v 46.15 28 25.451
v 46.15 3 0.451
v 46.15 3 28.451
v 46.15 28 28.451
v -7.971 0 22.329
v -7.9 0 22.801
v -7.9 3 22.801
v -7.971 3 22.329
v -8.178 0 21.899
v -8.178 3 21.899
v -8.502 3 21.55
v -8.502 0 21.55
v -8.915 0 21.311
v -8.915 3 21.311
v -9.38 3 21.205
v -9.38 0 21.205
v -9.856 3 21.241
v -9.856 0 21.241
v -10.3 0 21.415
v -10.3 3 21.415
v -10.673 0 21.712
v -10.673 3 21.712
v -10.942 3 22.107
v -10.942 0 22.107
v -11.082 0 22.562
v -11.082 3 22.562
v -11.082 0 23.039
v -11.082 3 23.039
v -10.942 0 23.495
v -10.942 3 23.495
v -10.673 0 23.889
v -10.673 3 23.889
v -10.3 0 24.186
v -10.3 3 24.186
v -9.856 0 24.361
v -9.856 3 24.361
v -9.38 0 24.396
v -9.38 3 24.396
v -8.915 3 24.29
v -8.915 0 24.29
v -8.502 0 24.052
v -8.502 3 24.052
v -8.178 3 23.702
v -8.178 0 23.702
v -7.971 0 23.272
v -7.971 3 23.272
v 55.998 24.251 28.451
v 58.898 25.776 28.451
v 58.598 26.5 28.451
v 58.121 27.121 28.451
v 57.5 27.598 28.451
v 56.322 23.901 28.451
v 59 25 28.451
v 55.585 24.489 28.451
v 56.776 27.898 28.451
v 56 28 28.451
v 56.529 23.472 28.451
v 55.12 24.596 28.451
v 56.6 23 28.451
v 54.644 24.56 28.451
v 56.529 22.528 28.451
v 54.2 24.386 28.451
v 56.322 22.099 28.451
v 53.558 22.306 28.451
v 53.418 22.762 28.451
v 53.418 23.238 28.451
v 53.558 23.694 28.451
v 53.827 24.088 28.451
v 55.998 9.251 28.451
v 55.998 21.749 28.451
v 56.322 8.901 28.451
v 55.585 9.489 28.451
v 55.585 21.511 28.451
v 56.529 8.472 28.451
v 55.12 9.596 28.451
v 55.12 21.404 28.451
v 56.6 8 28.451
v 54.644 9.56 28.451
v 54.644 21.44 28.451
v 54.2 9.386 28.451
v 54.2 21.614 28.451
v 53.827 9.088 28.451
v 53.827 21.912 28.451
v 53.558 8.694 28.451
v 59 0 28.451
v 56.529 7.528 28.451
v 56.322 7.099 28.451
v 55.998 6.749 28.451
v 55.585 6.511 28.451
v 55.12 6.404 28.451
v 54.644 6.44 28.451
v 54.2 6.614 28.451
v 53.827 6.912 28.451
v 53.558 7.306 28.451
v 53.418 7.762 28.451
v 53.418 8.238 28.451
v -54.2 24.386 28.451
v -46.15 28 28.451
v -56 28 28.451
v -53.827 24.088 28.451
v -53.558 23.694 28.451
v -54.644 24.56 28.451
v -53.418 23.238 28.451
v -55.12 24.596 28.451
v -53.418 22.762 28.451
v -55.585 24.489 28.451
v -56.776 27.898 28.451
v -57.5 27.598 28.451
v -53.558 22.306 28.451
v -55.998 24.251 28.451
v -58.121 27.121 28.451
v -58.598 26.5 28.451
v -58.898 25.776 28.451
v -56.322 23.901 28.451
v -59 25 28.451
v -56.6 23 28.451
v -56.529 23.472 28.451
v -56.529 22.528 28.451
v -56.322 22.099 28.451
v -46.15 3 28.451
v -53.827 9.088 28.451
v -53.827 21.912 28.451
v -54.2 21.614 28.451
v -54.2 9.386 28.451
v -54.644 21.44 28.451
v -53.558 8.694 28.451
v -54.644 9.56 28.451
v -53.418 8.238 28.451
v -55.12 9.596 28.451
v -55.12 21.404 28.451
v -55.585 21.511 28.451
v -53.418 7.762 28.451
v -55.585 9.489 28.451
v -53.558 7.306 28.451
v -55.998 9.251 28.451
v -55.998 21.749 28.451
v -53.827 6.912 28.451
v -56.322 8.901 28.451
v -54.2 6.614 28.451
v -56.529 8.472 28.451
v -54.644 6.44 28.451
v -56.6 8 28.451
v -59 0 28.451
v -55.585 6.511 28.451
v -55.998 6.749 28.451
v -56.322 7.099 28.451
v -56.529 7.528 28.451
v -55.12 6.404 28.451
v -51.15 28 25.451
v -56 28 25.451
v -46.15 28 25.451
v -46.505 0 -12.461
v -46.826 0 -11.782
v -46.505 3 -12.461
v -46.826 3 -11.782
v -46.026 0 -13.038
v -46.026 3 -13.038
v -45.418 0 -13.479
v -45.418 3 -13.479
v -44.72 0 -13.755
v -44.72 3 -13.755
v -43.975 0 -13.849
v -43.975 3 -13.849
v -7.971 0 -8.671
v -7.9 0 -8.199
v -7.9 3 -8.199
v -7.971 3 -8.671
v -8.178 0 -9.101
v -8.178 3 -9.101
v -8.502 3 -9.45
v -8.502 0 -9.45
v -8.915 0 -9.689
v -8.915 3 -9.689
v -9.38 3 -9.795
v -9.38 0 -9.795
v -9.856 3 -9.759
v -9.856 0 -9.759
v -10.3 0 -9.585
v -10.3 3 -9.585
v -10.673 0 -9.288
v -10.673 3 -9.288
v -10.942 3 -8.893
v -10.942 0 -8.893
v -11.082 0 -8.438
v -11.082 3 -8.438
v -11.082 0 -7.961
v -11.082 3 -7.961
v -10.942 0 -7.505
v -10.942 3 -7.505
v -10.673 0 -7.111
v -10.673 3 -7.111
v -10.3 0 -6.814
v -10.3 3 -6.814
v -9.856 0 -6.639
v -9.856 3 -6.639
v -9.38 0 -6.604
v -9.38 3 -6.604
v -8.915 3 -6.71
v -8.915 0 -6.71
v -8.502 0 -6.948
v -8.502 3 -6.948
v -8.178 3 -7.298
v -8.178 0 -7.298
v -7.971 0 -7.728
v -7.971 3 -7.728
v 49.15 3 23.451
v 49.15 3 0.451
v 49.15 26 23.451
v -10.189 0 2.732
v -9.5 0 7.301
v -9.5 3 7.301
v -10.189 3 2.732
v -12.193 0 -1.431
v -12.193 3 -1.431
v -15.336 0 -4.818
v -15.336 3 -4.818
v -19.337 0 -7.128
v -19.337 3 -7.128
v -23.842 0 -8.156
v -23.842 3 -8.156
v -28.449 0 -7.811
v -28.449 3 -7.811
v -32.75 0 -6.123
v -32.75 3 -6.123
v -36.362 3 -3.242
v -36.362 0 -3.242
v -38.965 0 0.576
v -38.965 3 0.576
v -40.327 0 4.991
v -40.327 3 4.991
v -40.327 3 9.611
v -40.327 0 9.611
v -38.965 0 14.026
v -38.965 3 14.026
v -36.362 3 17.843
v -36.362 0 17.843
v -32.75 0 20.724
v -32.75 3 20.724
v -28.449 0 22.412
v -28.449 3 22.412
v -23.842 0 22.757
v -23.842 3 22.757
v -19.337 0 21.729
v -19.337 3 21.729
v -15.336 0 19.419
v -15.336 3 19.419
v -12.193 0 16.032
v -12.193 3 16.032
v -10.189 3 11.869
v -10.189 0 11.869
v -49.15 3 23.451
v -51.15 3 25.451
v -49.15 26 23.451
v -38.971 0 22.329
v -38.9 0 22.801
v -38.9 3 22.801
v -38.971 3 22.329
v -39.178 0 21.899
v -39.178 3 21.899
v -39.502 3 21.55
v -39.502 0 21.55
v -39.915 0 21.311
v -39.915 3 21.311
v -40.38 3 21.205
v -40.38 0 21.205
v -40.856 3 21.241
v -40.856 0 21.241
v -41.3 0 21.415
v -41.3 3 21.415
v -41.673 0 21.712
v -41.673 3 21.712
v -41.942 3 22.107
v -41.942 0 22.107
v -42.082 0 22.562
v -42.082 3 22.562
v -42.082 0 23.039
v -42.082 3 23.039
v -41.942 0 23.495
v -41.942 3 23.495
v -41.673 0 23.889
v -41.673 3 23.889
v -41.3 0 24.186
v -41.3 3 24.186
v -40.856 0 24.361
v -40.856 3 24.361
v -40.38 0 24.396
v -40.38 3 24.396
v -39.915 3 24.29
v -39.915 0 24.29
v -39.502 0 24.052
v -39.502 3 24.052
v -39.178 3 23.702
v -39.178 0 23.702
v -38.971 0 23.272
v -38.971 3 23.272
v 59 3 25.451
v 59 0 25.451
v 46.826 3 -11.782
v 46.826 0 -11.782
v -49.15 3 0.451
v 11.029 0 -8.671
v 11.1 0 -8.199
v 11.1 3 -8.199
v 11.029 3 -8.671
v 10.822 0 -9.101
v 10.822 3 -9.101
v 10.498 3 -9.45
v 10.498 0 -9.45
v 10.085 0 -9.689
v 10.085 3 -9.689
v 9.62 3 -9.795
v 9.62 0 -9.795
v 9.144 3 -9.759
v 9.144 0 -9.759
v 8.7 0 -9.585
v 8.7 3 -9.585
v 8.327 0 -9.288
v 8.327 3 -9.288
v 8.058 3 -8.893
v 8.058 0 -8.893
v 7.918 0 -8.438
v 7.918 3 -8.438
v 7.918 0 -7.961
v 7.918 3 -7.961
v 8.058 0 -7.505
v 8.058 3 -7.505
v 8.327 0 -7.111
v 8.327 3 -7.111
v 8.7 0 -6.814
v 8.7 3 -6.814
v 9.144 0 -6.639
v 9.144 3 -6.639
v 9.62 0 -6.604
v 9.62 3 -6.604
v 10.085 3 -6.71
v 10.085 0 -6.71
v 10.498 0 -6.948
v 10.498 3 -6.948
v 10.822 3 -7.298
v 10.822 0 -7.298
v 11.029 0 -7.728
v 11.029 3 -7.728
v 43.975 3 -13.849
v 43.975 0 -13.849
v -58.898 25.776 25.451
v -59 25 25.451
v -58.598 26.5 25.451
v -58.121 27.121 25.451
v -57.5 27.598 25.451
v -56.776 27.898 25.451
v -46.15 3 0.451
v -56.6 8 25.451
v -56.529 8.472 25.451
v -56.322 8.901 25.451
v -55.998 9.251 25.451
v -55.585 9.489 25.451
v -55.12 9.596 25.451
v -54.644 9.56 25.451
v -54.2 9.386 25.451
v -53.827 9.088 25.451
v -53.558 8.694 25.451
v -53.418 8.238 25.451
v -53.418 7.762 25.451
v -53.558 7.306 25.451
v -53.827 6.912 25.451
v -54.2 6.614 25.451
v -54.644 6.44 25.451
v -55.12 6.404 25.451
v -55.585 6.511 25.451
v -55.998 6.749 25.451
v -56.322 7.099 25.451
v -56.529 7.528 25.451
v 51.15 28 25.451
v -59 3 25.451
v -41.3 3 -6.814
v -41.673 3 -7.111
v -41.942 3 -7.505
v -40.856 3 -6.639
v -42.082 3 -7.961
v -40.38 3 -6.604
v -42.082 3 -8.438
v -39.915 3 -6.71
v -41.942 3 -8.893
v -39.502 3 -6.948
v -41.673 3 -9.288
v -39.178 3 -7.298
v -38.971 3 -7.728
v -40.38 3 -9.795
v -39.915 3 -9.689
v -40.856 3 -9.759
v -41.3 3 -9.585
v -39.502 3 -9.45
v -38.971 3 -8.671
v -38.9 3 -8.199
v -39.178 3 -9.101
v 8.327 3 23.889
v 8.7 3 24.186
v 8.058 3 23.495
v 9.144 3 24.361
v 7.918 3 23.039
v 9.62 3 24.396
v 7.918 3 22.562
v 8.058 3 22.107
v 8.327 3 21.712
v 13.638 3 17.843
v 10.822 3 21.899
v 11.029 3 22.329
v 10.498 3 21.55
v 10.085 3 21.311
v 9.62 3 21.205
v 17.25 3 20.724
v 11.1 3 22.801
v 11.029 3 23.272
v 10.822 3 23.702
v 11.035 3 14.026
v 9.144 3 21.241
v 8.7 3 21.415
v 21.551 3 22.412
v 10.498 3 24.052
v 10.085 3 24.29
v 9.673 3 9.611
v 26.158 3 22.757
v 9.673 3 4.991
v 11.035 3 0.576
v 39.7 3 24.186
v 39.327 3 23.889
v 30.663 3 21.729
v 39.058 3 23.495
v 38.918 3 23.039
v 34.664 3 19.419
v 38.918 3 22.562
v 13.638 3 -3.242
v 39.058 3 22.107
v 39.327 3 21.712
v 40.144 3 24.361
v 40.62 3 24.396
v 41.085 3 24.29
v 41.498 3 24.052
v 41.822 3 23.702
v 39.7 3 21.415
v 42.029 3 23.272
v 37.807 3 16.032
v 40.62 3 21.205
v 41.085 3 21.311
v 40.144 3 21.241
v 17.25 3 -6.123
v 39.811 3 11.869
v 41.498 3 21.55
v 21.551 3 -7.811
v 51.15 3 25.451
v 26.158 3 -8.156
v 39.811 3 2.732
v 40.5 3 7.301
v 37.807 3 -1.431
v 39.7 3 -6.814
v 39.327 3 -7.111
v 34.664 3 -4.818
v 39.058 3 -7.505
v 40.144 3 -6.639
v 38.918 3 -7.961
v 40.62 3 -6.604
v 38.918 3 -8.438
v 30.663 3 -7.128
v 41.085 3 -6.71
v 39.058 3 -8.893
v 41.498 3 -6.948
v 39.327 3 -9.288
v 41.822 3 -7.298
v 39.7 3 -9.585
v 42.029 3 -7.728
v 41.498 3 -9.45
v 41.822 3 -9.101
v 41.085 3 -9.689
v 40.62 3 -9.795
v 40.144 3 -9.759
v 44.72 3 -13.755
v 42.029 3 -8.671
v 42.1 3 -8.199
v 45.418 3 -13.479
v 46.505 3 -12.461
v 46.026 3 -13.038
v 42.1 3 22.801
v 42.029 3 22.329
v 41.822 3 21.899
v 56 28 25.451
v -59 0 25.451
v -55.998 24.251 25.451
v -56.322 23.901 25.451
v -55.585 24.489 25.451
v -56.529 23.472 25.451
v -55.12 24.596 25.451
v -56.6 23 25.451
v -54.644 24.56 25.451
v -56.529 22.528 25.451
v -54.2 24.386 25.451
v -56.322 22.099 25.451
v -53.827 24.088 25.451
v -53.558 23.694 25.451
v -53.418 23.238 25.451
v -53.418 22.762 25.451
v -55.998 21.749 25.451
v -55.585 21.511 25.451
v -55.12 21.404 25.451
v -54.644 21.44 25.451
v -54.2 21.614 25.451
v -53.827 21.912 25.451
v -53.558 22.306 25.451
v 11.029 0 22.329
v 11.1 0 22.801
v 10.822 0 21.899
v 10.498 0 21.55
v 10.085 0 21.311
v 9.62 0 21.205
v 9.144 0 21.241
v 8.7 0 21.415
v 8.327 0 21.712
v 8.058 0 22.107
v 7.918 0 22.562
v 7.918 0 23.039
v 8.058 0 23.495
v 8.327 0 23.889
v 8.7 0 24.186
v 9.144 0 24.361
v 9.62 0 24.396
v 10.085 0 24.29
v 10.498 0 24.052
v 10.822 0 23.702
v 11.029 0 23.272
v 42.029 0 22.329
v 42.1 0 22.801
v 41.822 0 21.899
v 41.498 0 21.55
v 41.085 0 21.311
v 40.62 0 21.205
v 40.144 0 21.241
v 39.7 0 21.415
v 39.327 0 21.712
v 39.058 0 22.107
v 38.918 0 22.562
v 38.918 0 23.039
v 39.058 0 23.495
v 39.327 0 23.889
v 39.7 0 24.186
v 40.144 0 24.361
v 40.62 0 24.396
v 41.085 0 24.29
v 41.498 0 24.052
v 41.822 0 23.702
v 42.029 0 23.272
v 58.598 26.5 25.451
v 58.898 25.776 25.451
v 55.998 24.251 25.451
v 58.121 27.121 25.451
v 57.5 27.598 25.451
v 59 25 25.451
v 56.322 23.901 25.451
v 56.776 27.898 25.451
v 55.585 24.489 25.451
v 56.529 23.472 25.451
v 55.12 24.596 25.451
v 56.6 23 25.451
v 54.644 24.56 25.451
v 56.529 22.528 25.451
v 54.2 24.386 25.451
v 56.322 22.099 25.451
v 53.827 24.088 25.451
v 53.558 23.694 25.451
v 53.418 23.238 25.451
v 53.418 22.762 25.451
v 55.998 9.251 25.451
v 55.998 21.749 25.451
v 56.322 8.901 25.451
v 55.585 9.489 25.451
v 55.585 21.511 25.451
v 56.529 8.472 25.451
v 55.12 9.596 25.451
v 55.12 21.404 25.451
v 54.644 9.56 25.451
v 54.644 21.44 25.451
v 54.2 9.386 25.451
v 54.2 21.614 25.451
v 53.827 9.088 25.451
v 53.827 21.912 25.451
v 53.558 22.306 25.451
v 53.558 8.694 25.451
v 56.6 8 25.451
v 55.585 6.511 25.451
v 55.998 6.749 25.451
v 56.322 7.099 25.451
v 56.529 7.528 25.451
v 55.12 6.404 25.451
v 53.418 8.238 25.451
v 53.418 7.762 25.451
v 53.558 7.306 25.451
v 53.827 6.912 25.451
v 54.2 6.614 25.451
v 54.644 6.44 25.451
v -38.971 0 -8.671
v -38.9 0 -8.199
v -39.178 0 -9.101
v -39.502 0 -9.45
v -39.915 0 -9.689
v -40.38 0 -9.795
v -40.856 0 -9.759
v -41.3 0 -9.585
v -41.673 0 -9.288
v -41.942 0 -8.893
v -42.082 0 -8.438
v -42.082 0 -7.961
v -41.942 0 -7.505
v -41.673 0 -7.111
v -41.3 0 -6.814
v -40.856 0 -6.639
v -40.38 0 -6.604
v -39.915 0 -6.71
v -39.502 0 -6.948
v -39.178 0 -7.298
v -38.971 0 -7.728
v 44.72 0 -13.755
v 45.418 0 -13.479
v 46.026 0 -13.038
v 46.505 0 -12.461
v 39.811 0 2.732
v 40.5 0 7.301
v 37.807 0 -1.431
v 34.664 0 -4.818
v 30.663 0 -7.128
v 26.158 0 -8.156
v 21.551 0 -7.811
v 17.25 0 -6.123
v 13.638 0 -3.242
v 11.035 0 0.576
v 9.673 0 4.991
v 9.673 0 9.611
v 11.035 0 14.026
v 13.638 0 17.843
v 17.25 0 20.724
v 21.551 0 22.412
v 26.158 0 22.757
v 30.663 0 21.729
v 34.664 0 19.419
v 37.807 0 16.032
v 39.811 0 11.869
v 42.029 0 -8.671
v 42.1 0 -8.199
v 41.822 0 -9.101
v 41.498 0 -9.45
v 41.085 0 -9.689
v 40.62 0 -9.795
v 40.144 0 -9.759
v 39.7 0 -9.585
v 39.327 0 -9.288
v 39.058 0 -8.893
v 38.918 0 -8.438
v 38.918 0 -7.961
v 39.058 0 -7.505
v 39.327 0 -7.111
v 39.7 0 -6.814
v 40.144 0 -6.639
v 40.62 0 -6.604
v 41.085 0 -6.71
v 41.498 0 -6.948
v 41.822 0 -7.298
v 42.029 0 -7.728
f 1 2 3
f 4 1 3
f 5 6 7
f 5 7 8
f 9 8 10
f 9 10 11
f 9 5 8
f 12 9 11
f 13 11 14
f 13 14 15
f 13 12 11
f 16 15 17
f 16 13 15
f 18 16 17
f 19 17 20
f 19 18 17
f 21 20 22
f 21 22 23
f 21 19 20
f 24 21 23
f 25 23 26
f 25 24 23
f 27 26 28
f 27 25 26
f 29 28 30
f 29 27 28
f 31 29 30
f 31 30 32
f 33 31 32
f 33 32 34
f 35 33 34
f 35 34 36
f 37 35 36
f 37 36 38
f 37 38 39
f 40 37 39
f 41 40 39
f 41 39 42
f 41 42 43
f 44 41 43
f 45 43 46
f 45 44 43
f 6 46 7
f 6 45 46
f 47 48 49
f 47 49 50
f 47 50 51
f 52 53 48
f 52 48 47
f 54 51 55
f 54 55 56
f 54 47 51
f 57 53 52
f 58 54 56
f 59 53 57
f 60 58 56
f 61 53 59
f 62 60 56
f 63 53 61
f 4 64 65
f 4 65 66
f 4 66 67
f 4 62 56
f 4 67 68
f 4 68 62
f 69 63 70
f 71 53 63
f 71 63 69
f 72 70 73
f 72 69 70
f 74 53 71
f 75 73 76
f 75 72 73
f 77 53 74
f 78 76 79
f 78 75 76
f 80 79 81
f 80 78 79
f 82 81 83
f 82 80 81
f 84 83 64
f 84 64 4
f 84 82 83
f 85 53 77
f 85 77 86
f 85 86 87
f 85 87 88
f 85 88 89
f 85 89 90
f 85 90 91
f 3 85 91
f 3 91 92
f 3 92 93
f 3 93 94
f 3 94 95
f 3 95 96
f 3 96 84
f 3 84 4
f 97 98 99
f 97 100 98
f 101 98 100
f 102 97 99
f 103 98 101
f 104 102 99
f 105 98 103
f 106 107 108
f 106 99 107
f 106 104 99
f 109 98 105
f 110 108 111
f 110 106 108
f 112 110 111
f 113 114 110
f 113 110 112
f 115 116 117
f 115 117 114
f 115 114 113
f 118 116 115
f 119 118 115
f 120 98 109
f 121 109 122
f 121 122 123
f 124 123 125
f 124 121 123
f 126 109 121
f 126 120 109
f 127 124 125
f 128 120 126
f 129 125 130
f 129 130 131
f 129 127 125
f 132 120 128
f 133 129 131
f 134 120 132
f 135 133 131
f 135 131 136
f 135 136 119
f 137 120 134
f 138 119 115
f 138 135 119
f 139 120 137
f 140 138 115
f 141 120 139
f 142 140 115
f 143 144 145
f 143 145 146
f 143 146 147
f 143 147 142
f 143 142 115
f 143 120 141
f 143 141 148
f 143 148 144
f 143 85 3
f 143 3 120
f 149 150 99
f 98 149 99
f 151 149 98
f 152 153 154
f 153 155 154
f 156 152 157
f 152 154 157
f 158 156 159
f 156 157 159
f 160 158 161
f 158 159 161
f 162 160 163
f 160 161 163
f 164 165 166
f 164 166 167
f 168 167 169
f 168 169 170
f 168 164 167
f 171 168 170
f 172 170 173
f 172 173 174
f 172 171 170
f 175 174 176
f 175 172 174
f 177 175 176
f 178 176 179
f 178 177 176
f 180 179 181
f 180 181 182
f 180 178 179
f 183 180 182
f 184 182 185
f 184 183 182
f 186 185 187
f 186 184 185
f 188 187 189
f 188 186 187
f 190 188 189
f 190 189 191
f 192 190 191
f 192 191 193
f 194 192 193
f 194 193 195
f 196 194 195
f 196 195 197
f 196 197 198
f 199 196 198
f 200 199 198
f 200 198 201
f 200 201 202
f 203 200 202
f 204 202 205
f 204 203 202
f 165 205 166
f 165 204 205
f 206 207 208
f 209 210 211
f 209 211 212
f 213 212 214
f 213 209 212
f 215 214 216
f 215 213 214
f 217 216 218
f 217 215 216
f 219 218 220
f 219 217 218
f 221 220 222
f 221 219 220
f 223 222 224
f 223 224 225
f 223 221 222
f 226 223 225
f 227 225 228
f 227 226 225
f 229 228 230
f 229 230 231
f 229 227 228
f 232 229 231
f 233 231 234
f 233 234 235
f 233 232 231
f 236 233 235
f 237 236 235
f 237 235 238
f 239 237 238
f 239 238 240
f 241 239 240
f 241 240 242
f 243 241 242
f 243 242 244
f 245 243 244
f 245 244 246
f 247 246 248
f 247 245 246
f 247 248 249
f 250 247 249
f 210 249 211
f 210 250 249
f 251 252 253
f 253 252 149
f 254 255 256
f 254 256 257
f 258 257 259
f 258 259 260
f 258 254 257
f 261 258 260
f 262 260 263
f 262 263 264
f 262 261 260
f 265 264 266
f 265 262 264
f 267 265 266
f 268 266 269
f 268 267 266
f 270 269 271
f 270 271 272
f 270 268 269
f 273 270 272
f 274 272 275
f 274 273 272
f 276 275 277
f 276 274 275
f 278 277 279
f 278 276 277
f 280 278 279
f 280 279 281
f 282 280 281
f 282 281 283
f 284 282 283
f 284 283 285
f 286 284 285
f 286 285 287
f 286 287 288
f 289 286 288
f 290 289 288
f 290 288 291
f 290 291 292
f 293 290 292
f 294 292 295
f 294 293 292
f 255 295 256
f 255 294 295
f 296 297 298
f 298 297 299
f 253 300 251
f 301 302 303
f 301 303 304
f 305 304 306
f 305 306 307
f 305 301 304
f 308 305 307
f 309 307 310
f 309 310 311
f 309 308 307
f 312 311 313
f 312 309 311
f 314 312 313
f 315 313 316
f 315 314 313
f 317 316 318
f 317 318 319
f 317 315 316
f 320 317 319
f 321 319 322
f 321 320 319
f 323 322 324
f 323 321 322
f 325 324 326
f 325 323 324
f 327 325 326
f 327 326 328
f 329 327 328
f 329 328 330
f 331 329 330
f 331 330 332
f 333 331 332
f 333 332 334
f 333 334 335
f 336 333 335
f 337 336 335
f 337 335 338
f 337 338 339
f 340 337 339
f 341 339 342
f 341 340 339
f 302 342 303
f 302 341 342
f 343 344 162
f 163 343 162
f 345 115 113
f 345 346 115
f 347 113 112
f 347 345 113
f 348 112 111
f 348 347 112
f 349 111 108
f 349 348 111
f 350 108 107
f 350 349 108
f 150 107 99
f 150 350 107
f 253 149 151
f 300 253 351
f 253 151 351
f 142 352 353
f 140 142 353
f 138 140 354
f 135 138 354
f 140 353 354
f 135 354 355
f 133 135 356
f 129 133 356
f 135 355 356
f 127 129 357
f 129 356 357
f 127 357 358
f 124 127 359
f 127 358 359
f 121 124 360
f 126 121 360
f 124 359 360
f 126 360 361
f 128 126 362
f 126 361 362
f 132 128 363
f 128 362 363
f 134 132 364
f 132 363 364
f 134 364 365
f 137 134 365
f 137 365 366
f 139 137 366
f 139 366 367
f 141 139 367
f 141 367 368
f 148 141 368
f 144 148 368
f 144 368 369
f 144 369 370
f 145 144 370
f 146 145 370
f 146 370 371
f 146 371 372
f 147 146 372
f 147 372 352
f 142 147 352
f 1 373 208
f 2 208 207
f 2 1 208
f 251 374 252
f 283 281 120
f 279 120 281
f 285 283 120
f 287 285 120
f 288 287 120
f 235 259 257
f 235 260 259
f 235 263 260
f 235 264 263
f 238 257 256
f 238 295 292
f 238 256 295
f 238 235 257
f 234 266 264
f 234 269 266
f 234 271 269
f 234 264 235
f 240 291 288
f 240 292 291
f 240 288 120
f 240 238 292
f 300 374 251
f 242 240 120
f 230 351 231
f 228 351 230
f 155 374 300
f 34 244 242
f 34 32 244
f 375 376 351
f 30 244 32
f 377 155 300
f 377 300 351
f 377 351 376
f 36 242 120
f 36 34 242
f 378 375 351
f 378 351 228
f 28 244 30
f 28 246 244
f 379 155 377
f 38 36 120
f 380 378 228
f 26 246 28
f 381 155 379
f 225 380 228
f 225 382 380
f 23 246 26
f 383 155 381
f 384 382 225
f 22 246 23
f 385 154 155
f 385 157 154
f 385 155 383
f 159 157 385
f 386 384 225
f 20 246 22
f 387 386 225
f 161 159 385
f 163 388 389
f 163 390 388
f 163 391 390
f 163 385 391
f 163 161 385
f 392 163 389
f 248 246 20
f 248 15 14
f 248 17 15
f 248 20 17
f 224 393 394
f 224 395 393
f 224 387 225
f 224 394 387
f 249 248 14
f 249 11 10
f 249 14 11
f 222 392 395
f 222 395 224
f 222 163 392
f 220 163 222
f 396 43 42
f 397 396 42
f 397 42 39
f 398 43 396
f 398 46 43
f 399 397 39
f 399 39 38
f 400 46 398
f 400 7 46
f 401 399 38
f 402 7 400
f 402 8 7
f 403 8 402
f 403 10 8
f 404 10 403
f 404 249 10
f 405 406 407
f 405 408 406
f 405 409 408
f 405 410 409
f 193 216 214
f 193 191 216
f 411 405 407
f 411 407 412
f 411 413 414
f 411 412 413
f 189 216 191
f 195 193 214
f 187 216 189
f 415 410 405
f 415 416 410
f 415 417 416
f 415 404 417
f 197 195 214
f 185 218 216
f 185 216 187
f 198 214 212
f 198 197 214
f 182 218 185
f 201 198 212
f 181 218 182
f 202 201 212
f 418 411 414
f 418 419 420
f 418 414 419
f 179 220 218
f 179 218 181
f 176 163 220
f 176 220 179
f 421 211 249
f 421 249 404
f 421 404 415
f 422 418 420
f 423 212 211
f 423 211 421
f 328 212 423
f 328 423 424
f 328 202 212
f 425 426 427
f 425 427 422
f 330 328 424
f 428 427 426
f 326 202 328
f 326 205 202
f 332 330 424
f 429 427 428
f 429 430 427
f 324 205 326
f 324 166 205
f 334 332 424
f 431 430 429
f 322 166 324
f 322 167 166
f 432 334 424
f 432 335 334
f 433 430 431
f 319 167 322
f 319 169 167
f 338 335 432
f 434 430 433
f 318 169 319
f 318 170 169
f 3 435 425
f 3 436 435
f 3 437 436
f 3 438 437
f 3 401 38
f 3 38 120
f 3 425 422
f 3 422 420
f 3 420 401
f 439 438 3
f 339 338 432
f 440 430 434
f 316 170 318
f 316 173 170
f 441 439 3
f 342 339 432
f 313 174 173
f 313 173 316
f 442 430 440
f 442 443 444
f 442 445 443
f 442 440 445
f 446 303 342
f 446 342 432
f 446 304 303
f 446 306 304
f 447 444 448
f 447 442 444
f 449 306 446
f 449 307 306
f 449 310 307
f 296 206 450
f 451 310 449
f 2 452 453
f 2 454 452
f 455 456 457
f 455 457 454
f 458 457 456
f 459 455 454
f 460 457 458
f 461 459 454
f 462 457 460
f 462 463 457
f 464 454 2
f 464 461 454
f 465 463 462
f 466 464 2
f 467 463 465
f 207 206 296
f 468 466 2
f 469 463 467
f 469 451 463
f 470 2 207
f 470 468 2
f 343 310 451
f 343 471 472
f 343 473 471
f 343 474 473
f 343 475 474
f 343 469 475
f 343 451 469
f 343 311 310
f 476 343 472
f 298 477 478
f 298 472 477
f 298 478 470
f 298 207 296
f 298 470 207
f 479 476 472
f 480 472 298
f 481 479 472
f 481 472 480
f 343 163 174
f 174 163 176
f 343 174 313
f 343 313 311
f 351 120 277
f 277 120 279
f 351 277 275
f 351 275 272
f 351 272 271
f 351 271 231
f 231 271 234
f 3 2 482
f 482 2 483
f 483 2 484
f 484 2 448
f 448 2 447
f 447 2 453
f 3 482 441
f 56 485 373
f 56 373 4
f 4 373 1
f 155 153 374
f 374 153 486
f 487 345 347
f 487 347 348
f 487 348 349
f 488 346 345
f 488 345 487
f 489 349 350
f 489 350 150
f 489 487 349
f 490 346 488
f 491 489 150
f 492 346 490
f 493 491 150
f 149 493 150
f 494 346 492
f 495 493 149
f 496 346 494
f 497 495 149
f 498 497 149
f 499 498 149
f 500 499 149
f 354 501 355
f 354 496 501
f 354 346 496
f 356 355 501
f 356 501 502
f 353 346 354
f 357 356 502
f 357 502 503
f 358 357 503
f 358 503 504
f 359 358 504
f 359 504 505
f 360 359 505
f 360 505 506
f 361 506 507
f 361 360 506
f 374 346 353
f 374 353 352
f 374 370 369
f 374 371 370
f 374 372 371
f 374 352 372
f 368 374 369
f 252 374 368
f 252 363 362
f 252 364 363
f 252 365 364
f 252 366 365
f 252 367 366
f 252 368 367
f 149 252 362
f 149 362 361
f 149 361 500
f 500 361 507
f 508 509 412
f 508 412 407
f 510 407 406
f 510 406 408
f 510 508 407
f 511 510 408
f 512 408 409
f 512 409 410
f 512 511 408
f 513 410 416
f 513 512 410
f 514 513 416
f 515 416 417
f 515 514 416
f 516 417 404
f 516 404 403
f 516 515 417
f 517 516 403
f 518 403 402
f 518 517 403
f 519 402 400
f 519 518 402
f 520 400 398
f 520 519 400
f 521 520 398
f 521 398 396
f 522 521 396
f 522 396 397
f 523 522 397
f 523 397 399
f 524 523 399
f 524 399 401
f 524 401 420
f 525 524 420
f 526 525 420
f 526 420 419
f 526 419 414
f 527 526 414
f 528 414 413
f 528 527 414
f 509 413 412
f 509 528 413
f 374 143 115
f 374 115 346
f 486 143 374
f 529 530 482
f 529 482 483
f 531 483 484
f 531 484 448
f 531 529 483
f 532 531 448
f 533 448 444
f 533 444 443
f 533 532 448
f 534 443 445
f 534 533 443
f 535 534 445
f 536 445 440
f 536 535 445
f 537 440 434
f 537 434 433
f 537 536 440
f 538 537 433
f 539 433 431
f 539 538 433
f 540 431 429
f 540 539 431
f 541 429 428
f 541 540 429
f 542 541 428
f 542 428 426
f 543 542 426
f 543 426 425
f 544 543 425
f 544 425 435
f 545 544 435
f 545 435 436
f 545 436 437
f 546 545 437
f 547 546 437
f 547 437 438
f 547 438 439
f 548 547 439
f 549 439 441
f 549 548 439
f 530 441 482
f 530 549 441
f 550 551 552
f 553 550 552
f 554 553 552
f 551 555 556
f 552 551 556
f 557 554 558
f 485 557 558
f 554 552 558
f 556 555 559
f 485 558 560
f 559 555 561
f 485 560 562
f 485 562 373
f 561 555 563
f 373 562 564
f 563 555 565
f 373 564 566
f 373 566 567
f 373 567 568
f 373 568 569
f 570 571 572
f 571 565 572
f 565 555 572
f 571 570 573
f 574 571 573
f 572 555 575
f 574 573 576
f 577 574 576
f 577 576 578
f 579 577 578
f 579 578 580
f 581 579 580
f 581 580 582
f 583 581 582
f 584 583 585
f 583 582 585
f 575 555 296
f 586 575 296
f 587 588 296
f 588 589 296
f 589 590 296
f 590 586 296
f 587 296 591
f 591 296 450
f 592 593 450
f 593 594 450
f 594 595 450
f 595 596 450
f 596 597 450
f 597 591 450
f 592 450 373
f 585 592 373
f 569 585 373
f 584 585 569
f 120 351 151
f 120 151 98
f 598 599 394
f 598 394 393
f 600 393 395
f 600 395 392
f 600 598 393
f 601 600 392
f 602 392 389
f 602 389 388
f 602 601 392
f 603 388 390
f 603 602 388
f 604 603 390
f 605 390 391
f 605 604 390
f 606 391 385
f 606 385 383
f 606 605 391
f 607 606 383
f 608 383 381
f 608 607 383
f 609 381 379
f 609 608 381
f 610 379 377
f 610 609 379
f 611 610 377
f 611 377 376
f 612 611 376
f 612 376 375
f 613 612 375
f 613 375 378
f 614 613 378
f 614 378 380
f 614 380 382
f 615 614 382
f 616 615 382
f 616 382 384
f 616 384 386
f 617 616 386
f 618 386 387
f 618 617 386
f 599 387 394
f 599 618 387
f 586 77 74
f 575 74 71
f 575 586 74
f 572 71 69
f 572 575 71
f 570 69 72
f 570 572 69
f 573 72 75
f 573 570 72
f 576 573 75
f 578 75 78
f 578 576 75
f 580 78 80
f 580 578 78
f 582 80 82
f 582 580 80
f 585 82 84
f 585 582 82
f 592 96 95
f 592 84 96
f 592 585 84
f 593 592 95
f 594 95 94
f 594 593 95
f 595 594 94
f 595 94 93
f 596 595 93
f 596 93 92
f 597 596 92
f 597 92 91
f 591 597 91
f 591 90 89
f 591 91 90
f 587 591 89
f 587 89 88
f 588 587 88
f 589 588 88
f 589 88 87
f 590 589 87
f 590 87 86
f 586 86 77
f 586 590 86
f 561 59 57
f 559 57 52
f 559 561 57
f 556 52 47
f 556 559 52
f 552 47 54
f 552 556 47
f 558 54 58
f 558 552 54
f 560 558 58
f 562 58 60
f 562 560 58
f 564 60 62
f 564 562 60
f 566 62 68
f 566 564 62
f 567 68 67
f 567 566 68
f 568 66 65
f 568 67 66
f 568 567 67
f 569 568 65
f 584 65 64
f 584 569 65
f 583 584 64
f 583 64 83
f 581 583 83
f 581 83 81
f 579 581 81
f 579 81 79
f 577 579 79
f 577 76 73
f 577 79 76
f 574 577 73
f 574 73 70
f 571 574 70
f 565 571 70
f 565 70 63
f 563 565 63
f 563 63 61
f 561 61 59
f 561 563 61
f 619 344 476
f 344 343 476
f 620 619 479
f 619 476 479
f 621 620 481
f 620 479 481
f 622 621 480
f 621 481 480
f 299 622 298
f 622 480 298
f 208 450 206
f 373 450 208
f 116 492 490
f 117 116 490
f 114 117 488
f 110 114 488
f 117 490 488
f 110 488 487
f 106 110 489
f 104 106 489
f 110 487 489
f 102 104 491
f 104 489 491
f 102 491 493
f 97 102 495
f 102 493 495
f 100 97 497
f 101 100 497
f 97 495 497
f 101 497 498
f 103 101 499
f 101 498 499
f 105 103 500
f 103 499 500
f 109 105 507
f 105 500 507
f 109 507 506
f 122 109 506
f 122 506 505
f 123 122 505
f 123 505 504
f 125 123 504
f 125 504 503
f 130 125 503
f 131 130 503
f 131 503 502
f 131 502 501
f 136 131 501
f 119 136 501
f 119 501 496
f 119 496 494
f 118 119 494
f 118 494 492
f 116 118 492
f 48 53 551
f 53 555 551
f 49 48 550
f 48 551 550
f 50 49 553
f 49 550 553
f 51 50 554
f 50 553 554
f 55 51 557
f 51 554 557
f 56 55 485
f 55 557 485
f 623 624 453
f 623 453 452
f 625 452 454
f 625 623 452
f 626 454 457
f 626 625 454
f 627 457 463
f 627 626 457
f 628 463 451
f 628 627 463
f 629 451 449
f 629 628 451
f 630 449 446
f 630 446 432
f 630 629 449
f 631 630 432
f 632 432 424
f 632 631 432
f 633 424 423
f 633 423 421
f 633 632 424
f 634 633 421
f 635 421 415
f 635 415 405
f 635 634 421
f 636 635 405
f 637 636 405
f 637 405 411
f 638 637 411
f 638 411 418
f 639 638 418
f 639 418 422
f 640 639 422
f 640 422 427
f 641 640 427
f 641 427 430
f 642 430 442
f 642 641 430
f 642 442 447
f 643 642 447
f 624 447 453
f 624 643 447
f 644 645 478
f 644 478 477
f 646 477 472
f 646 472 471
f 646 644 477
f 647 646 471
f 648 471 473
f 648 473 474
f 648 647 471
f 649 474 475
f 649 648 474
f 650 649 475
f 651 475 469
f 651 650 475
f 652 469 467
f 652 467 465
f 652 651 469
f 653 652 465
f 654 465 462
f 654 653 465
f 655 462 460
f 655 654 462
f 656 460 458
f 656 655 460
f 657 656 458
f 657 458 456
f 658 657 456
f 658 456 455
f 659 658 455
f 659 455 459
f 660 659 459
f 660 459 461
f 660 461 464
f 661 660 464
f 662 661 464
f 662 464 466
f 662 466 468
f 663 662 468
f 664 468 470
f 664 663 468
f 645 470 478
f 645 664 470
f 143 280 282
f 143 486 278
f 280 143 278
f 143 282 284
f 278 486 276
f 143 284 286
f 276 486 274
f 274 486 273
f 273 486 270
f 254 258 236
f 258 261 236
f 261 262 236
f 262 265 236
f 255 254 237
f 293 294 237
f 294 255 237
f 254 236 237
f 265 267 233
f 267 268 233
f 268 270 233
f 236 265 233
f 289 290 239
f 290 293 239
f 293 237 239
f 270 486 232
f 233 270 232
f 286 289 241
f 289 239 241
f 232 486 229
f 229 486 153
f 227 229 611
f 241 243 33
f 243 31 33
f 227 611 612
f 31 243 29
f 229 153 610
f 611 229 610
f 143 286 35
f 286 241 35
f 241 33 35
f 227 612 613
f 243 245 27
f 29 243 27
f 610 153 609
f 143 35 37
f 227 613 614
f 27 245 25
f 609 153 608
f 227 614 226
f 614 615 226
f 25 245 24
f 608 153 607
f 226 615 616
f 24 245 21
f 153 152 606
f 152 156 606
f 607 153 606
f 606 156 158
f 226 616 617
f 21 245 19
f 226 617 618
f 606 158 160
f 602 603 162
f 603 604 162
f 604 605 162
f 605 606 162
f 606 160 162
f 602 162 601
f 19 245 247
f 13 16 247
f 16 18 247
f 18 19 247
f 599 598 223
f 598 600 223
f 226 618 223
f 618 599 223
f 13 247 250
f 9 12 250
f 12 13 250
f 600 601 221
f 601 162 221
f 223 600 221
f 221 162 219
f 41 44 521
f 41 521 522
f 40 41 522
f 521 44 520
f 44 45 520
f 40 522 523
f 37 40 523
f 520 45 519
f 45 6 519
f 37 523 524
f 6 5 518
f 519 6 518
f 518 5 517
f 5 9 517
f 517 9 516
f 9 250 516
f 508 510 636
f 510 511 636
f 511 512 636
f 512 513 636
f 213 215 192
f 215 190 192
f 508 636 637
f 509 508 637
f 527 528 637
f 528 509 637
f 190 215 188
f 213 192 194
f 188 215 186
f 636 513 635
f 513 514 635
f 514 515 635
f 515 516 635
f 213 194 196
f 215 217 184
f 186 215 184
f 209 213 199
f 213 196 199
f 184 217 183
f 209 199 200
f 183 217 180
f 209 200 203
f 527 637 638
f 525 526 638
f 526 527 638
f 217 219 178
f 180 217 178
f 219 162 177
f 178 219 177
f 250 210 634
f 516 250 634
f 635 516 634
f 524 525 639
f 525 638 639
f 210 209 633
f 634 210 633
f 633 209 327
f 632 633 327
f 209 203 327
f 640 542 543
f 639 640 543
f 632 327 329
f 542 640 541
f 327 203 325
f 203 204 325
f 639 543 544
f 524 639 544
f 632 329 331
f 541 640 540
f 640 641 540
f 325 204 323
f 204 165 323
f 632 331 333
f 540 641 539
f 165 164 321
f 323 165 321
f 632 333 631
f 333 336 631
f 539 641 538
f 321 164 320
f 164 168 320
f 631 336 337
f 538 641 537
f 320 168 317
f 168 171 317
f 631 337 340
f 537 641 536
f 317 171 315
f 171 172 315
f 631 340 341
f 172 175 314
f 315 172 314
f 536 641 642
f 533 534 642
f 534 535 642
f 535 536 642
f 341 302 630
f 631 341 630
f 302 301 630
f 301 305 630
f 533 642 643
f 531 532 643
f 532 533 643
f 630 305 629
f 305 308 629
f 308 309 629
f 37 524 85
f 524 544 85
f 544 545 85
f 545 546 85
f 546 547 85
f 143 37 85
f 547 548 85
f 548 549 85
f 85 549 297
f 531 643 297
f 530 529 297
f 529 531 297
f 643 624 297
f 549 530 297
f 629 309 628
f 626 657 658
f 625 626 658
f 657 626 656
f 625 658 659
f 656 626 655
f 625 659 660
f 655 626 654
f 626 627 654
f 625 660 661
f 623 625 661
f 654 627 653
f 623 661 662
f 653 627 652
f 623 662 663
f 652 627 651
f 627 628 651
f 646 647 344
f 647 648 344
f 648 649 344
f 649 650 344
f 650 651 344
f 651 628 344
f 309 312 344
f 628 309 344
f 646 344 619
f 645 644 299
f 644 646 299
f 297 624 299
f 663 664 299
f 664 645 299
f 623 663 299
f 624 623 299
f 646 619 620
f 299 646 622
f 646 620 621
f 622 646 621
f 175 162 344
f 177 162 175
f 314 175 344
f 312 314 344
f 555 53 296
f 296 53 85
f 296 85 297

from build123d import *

# Parameters (mm, degrees)
SKETCH1_R                = 1.6
SKETCH1_R_2              = 15.5
BOSS_EXTRUDE1_DEPTH      = 3
SKETCH2_W                = 12.85
SKETCH2_H                = 3
BOSS_EXTRUDE2_DEPTH      = 25
SKETCH3_R                = 1.6
CUT_EXTRUDE1_DEPTH       = 4
BOSS_EXTRUDE3_DEPTH      = 3
CHAMFER1_SIZE            = 2
FILLET1_R                = 3
FILLET2_R                = 3
CHAMFER1_OF_MIRROR1_SIZE = 2
FILLET1_OF_MIRROR1_R     = 3


with BuildPart() as part:
    # Sketch1 → Boss-Extrude1 (new body)
    with BuildSketch(Plane(origin=(0, 0, 0), x_dir=(1, 0, 0), z_dir=(0, 1, 0))):
        Polygon((46.15, 13.849265428), (-46.15, 13.849265428), (-59, -25.450734572), (-59, -28.450734572), (59, -28.450734572), (59, -25.450734572), align=None)
        with Locations((-40.5, 8.199265428)):
            Circle(SKETCH1_R, mode=Mode.SUBTRACT)
        with Locations((-9.5, 8.199265428)):
            Circle(SKETCH1_R, mode=Mode.SUBTRACT)
        with Locations((-40.5, -22.800734572)):
            Circle(SKETCH1_R, mode=Mode.SUBTRACT)
        with Locations((-9.5, -22.800734572)):
            Circle(SKETCH1_R, mode=Mode.SUBTRACT)
        with Locations((-25, -7.300734572)):
            Circle(SKETCH1_R_2, mode=Mode.SUBTRACT)
        with Locations((40.5, -22.800734572)):
            Circle(SKETCH1_R, mode=Mode.SUBTRACT)
        with Locations((9.5, -22.800734572)):
            Circle(SKETCH1_R, mode=Mode.SUBTRACT)
        with Locations((9.5, 8.199265428)):
            Circle(SKETCH1_R, mode=Mode.SUBTRACT)
        with Locations((40.5, 8.199265428)):
            Circle(SKETCH1_R, mode=Mode.SUBTRACT)
        with Locations((25, -7.300734572)):
            Circle(SKETCH1_R_2, mode=Mode.SUBTRACT)
    extrude(amount=BOSS_EXTRUDE1_DEPTH)

    # Sketch2 → Boss-Extrude2 (add)
    with BuildSketch(Plane(origin=(0, 3, 0), x_dir=(1, 0, 0), z_dir=(0, 1, 0))):
        with Locations((-52.575, -26.950734572)):
            Rectangle(SKETCH2_W, SKETCH2_H)
    boss_extrude2 = extrude(amount=BOSS_EXTRUDE2_DEPTH)

    # Sketch3 → Cut-Extrude1 (cut, through all)
    with BuildSketch(Plane(origin=(0, 0, 25.450734572), x_dir=(-1, 0, 0), z_dir=(0, 0, -1))):
        with Locations((55, 8)):
            Circle(SKETCH3_R)
        with Locations((55, 23)):
            Circle(SKETCH3_R)
    cut_extrude1 = extrude(amount=-CUT_EXTRUDE1_DEPTH, mode=Mode.SUBTRACT)

    # Sketch4 → Boss-Extrude3 (add)
    with BuildSketch(Plane(origin=(-46.15, 0, 0), x_dir=(0, 0, -1), z_dir=(1, 0, 0))):
        Polygon((-25.450734572, 28), (-0.450734572, 3), (-25.450734572, 3), align=None)
    boss_extrude3 = extrude(amount=-BOSS_EXTRUDE3_DEPTH)

    # Chamfer1
    chamfer1_edges = [part.edges().sort_by_distance(p)[0] for p in [
        (-49.15, 15.5, 25.450734572),
    ]]
    chamfer(chamfer1_edges, length=CHAMFER1_SIZE)

    # Fillet1
    fillet1_edges = [part.edges().sort_by_distance(p)[0] for p in [
        (-59, 28, 26.950734572),
    ]]
    fillet(fillet1_edges, radius=FILLET1_R)

    # Fillet2
    fillet2_edges = [part.edges().sort_by_distance(p)[0] for p in [
        (-46.15, 1.5, -13.849265428),
        (46.15, 1.5, -13.849265428),
    ]]
    fillet(fillet2_edges, radius=FILLET2_R)

    # Mirror1: Boss-Extrude2, Cut-Extrude1, Boss-Extrude3 across plane
    add(boss_extrude2.mirror(Plane(origin=(0, 0, 0), x_dir=(0, 0, 1), z_dir=(1, 0, 0))))
    add(cut_extrude1.mirror(Plane(origin=(0, 0, 0), x_dir=(0, 0, 1), z_dir=(1, 0, 0))), mode=Mode.SUBTRACT)
    add(boss_extrude3.mirror(Plane(origin=(0, 0, 0), x_dir=(0, 0, 1), z_dir=(1, 0, 0))))

    # Chamfer1 of Mirror1
    chamfer1_of_mirror1_edges = [part.edges().sort_by_distance(p)[0] for p in [
        (49.15, 15.5, 25.450734572),
    ]]
    chamfer(chamfer1_of_mirror1_edges, length=CHAMFER1_OF_MIRROR1_SIZE)

    # Fillet1 of Mirror1
    fillet1_of_mirror1_edges = [part.edges().sort_by_distance(p)[0] for p in [
        (59, 28, 26.950734572),
    ]]
    fillet(fillet1_of_mirror1_edges, radius=FILLET1_OF_MIRROR1_R)


solid = part.part
